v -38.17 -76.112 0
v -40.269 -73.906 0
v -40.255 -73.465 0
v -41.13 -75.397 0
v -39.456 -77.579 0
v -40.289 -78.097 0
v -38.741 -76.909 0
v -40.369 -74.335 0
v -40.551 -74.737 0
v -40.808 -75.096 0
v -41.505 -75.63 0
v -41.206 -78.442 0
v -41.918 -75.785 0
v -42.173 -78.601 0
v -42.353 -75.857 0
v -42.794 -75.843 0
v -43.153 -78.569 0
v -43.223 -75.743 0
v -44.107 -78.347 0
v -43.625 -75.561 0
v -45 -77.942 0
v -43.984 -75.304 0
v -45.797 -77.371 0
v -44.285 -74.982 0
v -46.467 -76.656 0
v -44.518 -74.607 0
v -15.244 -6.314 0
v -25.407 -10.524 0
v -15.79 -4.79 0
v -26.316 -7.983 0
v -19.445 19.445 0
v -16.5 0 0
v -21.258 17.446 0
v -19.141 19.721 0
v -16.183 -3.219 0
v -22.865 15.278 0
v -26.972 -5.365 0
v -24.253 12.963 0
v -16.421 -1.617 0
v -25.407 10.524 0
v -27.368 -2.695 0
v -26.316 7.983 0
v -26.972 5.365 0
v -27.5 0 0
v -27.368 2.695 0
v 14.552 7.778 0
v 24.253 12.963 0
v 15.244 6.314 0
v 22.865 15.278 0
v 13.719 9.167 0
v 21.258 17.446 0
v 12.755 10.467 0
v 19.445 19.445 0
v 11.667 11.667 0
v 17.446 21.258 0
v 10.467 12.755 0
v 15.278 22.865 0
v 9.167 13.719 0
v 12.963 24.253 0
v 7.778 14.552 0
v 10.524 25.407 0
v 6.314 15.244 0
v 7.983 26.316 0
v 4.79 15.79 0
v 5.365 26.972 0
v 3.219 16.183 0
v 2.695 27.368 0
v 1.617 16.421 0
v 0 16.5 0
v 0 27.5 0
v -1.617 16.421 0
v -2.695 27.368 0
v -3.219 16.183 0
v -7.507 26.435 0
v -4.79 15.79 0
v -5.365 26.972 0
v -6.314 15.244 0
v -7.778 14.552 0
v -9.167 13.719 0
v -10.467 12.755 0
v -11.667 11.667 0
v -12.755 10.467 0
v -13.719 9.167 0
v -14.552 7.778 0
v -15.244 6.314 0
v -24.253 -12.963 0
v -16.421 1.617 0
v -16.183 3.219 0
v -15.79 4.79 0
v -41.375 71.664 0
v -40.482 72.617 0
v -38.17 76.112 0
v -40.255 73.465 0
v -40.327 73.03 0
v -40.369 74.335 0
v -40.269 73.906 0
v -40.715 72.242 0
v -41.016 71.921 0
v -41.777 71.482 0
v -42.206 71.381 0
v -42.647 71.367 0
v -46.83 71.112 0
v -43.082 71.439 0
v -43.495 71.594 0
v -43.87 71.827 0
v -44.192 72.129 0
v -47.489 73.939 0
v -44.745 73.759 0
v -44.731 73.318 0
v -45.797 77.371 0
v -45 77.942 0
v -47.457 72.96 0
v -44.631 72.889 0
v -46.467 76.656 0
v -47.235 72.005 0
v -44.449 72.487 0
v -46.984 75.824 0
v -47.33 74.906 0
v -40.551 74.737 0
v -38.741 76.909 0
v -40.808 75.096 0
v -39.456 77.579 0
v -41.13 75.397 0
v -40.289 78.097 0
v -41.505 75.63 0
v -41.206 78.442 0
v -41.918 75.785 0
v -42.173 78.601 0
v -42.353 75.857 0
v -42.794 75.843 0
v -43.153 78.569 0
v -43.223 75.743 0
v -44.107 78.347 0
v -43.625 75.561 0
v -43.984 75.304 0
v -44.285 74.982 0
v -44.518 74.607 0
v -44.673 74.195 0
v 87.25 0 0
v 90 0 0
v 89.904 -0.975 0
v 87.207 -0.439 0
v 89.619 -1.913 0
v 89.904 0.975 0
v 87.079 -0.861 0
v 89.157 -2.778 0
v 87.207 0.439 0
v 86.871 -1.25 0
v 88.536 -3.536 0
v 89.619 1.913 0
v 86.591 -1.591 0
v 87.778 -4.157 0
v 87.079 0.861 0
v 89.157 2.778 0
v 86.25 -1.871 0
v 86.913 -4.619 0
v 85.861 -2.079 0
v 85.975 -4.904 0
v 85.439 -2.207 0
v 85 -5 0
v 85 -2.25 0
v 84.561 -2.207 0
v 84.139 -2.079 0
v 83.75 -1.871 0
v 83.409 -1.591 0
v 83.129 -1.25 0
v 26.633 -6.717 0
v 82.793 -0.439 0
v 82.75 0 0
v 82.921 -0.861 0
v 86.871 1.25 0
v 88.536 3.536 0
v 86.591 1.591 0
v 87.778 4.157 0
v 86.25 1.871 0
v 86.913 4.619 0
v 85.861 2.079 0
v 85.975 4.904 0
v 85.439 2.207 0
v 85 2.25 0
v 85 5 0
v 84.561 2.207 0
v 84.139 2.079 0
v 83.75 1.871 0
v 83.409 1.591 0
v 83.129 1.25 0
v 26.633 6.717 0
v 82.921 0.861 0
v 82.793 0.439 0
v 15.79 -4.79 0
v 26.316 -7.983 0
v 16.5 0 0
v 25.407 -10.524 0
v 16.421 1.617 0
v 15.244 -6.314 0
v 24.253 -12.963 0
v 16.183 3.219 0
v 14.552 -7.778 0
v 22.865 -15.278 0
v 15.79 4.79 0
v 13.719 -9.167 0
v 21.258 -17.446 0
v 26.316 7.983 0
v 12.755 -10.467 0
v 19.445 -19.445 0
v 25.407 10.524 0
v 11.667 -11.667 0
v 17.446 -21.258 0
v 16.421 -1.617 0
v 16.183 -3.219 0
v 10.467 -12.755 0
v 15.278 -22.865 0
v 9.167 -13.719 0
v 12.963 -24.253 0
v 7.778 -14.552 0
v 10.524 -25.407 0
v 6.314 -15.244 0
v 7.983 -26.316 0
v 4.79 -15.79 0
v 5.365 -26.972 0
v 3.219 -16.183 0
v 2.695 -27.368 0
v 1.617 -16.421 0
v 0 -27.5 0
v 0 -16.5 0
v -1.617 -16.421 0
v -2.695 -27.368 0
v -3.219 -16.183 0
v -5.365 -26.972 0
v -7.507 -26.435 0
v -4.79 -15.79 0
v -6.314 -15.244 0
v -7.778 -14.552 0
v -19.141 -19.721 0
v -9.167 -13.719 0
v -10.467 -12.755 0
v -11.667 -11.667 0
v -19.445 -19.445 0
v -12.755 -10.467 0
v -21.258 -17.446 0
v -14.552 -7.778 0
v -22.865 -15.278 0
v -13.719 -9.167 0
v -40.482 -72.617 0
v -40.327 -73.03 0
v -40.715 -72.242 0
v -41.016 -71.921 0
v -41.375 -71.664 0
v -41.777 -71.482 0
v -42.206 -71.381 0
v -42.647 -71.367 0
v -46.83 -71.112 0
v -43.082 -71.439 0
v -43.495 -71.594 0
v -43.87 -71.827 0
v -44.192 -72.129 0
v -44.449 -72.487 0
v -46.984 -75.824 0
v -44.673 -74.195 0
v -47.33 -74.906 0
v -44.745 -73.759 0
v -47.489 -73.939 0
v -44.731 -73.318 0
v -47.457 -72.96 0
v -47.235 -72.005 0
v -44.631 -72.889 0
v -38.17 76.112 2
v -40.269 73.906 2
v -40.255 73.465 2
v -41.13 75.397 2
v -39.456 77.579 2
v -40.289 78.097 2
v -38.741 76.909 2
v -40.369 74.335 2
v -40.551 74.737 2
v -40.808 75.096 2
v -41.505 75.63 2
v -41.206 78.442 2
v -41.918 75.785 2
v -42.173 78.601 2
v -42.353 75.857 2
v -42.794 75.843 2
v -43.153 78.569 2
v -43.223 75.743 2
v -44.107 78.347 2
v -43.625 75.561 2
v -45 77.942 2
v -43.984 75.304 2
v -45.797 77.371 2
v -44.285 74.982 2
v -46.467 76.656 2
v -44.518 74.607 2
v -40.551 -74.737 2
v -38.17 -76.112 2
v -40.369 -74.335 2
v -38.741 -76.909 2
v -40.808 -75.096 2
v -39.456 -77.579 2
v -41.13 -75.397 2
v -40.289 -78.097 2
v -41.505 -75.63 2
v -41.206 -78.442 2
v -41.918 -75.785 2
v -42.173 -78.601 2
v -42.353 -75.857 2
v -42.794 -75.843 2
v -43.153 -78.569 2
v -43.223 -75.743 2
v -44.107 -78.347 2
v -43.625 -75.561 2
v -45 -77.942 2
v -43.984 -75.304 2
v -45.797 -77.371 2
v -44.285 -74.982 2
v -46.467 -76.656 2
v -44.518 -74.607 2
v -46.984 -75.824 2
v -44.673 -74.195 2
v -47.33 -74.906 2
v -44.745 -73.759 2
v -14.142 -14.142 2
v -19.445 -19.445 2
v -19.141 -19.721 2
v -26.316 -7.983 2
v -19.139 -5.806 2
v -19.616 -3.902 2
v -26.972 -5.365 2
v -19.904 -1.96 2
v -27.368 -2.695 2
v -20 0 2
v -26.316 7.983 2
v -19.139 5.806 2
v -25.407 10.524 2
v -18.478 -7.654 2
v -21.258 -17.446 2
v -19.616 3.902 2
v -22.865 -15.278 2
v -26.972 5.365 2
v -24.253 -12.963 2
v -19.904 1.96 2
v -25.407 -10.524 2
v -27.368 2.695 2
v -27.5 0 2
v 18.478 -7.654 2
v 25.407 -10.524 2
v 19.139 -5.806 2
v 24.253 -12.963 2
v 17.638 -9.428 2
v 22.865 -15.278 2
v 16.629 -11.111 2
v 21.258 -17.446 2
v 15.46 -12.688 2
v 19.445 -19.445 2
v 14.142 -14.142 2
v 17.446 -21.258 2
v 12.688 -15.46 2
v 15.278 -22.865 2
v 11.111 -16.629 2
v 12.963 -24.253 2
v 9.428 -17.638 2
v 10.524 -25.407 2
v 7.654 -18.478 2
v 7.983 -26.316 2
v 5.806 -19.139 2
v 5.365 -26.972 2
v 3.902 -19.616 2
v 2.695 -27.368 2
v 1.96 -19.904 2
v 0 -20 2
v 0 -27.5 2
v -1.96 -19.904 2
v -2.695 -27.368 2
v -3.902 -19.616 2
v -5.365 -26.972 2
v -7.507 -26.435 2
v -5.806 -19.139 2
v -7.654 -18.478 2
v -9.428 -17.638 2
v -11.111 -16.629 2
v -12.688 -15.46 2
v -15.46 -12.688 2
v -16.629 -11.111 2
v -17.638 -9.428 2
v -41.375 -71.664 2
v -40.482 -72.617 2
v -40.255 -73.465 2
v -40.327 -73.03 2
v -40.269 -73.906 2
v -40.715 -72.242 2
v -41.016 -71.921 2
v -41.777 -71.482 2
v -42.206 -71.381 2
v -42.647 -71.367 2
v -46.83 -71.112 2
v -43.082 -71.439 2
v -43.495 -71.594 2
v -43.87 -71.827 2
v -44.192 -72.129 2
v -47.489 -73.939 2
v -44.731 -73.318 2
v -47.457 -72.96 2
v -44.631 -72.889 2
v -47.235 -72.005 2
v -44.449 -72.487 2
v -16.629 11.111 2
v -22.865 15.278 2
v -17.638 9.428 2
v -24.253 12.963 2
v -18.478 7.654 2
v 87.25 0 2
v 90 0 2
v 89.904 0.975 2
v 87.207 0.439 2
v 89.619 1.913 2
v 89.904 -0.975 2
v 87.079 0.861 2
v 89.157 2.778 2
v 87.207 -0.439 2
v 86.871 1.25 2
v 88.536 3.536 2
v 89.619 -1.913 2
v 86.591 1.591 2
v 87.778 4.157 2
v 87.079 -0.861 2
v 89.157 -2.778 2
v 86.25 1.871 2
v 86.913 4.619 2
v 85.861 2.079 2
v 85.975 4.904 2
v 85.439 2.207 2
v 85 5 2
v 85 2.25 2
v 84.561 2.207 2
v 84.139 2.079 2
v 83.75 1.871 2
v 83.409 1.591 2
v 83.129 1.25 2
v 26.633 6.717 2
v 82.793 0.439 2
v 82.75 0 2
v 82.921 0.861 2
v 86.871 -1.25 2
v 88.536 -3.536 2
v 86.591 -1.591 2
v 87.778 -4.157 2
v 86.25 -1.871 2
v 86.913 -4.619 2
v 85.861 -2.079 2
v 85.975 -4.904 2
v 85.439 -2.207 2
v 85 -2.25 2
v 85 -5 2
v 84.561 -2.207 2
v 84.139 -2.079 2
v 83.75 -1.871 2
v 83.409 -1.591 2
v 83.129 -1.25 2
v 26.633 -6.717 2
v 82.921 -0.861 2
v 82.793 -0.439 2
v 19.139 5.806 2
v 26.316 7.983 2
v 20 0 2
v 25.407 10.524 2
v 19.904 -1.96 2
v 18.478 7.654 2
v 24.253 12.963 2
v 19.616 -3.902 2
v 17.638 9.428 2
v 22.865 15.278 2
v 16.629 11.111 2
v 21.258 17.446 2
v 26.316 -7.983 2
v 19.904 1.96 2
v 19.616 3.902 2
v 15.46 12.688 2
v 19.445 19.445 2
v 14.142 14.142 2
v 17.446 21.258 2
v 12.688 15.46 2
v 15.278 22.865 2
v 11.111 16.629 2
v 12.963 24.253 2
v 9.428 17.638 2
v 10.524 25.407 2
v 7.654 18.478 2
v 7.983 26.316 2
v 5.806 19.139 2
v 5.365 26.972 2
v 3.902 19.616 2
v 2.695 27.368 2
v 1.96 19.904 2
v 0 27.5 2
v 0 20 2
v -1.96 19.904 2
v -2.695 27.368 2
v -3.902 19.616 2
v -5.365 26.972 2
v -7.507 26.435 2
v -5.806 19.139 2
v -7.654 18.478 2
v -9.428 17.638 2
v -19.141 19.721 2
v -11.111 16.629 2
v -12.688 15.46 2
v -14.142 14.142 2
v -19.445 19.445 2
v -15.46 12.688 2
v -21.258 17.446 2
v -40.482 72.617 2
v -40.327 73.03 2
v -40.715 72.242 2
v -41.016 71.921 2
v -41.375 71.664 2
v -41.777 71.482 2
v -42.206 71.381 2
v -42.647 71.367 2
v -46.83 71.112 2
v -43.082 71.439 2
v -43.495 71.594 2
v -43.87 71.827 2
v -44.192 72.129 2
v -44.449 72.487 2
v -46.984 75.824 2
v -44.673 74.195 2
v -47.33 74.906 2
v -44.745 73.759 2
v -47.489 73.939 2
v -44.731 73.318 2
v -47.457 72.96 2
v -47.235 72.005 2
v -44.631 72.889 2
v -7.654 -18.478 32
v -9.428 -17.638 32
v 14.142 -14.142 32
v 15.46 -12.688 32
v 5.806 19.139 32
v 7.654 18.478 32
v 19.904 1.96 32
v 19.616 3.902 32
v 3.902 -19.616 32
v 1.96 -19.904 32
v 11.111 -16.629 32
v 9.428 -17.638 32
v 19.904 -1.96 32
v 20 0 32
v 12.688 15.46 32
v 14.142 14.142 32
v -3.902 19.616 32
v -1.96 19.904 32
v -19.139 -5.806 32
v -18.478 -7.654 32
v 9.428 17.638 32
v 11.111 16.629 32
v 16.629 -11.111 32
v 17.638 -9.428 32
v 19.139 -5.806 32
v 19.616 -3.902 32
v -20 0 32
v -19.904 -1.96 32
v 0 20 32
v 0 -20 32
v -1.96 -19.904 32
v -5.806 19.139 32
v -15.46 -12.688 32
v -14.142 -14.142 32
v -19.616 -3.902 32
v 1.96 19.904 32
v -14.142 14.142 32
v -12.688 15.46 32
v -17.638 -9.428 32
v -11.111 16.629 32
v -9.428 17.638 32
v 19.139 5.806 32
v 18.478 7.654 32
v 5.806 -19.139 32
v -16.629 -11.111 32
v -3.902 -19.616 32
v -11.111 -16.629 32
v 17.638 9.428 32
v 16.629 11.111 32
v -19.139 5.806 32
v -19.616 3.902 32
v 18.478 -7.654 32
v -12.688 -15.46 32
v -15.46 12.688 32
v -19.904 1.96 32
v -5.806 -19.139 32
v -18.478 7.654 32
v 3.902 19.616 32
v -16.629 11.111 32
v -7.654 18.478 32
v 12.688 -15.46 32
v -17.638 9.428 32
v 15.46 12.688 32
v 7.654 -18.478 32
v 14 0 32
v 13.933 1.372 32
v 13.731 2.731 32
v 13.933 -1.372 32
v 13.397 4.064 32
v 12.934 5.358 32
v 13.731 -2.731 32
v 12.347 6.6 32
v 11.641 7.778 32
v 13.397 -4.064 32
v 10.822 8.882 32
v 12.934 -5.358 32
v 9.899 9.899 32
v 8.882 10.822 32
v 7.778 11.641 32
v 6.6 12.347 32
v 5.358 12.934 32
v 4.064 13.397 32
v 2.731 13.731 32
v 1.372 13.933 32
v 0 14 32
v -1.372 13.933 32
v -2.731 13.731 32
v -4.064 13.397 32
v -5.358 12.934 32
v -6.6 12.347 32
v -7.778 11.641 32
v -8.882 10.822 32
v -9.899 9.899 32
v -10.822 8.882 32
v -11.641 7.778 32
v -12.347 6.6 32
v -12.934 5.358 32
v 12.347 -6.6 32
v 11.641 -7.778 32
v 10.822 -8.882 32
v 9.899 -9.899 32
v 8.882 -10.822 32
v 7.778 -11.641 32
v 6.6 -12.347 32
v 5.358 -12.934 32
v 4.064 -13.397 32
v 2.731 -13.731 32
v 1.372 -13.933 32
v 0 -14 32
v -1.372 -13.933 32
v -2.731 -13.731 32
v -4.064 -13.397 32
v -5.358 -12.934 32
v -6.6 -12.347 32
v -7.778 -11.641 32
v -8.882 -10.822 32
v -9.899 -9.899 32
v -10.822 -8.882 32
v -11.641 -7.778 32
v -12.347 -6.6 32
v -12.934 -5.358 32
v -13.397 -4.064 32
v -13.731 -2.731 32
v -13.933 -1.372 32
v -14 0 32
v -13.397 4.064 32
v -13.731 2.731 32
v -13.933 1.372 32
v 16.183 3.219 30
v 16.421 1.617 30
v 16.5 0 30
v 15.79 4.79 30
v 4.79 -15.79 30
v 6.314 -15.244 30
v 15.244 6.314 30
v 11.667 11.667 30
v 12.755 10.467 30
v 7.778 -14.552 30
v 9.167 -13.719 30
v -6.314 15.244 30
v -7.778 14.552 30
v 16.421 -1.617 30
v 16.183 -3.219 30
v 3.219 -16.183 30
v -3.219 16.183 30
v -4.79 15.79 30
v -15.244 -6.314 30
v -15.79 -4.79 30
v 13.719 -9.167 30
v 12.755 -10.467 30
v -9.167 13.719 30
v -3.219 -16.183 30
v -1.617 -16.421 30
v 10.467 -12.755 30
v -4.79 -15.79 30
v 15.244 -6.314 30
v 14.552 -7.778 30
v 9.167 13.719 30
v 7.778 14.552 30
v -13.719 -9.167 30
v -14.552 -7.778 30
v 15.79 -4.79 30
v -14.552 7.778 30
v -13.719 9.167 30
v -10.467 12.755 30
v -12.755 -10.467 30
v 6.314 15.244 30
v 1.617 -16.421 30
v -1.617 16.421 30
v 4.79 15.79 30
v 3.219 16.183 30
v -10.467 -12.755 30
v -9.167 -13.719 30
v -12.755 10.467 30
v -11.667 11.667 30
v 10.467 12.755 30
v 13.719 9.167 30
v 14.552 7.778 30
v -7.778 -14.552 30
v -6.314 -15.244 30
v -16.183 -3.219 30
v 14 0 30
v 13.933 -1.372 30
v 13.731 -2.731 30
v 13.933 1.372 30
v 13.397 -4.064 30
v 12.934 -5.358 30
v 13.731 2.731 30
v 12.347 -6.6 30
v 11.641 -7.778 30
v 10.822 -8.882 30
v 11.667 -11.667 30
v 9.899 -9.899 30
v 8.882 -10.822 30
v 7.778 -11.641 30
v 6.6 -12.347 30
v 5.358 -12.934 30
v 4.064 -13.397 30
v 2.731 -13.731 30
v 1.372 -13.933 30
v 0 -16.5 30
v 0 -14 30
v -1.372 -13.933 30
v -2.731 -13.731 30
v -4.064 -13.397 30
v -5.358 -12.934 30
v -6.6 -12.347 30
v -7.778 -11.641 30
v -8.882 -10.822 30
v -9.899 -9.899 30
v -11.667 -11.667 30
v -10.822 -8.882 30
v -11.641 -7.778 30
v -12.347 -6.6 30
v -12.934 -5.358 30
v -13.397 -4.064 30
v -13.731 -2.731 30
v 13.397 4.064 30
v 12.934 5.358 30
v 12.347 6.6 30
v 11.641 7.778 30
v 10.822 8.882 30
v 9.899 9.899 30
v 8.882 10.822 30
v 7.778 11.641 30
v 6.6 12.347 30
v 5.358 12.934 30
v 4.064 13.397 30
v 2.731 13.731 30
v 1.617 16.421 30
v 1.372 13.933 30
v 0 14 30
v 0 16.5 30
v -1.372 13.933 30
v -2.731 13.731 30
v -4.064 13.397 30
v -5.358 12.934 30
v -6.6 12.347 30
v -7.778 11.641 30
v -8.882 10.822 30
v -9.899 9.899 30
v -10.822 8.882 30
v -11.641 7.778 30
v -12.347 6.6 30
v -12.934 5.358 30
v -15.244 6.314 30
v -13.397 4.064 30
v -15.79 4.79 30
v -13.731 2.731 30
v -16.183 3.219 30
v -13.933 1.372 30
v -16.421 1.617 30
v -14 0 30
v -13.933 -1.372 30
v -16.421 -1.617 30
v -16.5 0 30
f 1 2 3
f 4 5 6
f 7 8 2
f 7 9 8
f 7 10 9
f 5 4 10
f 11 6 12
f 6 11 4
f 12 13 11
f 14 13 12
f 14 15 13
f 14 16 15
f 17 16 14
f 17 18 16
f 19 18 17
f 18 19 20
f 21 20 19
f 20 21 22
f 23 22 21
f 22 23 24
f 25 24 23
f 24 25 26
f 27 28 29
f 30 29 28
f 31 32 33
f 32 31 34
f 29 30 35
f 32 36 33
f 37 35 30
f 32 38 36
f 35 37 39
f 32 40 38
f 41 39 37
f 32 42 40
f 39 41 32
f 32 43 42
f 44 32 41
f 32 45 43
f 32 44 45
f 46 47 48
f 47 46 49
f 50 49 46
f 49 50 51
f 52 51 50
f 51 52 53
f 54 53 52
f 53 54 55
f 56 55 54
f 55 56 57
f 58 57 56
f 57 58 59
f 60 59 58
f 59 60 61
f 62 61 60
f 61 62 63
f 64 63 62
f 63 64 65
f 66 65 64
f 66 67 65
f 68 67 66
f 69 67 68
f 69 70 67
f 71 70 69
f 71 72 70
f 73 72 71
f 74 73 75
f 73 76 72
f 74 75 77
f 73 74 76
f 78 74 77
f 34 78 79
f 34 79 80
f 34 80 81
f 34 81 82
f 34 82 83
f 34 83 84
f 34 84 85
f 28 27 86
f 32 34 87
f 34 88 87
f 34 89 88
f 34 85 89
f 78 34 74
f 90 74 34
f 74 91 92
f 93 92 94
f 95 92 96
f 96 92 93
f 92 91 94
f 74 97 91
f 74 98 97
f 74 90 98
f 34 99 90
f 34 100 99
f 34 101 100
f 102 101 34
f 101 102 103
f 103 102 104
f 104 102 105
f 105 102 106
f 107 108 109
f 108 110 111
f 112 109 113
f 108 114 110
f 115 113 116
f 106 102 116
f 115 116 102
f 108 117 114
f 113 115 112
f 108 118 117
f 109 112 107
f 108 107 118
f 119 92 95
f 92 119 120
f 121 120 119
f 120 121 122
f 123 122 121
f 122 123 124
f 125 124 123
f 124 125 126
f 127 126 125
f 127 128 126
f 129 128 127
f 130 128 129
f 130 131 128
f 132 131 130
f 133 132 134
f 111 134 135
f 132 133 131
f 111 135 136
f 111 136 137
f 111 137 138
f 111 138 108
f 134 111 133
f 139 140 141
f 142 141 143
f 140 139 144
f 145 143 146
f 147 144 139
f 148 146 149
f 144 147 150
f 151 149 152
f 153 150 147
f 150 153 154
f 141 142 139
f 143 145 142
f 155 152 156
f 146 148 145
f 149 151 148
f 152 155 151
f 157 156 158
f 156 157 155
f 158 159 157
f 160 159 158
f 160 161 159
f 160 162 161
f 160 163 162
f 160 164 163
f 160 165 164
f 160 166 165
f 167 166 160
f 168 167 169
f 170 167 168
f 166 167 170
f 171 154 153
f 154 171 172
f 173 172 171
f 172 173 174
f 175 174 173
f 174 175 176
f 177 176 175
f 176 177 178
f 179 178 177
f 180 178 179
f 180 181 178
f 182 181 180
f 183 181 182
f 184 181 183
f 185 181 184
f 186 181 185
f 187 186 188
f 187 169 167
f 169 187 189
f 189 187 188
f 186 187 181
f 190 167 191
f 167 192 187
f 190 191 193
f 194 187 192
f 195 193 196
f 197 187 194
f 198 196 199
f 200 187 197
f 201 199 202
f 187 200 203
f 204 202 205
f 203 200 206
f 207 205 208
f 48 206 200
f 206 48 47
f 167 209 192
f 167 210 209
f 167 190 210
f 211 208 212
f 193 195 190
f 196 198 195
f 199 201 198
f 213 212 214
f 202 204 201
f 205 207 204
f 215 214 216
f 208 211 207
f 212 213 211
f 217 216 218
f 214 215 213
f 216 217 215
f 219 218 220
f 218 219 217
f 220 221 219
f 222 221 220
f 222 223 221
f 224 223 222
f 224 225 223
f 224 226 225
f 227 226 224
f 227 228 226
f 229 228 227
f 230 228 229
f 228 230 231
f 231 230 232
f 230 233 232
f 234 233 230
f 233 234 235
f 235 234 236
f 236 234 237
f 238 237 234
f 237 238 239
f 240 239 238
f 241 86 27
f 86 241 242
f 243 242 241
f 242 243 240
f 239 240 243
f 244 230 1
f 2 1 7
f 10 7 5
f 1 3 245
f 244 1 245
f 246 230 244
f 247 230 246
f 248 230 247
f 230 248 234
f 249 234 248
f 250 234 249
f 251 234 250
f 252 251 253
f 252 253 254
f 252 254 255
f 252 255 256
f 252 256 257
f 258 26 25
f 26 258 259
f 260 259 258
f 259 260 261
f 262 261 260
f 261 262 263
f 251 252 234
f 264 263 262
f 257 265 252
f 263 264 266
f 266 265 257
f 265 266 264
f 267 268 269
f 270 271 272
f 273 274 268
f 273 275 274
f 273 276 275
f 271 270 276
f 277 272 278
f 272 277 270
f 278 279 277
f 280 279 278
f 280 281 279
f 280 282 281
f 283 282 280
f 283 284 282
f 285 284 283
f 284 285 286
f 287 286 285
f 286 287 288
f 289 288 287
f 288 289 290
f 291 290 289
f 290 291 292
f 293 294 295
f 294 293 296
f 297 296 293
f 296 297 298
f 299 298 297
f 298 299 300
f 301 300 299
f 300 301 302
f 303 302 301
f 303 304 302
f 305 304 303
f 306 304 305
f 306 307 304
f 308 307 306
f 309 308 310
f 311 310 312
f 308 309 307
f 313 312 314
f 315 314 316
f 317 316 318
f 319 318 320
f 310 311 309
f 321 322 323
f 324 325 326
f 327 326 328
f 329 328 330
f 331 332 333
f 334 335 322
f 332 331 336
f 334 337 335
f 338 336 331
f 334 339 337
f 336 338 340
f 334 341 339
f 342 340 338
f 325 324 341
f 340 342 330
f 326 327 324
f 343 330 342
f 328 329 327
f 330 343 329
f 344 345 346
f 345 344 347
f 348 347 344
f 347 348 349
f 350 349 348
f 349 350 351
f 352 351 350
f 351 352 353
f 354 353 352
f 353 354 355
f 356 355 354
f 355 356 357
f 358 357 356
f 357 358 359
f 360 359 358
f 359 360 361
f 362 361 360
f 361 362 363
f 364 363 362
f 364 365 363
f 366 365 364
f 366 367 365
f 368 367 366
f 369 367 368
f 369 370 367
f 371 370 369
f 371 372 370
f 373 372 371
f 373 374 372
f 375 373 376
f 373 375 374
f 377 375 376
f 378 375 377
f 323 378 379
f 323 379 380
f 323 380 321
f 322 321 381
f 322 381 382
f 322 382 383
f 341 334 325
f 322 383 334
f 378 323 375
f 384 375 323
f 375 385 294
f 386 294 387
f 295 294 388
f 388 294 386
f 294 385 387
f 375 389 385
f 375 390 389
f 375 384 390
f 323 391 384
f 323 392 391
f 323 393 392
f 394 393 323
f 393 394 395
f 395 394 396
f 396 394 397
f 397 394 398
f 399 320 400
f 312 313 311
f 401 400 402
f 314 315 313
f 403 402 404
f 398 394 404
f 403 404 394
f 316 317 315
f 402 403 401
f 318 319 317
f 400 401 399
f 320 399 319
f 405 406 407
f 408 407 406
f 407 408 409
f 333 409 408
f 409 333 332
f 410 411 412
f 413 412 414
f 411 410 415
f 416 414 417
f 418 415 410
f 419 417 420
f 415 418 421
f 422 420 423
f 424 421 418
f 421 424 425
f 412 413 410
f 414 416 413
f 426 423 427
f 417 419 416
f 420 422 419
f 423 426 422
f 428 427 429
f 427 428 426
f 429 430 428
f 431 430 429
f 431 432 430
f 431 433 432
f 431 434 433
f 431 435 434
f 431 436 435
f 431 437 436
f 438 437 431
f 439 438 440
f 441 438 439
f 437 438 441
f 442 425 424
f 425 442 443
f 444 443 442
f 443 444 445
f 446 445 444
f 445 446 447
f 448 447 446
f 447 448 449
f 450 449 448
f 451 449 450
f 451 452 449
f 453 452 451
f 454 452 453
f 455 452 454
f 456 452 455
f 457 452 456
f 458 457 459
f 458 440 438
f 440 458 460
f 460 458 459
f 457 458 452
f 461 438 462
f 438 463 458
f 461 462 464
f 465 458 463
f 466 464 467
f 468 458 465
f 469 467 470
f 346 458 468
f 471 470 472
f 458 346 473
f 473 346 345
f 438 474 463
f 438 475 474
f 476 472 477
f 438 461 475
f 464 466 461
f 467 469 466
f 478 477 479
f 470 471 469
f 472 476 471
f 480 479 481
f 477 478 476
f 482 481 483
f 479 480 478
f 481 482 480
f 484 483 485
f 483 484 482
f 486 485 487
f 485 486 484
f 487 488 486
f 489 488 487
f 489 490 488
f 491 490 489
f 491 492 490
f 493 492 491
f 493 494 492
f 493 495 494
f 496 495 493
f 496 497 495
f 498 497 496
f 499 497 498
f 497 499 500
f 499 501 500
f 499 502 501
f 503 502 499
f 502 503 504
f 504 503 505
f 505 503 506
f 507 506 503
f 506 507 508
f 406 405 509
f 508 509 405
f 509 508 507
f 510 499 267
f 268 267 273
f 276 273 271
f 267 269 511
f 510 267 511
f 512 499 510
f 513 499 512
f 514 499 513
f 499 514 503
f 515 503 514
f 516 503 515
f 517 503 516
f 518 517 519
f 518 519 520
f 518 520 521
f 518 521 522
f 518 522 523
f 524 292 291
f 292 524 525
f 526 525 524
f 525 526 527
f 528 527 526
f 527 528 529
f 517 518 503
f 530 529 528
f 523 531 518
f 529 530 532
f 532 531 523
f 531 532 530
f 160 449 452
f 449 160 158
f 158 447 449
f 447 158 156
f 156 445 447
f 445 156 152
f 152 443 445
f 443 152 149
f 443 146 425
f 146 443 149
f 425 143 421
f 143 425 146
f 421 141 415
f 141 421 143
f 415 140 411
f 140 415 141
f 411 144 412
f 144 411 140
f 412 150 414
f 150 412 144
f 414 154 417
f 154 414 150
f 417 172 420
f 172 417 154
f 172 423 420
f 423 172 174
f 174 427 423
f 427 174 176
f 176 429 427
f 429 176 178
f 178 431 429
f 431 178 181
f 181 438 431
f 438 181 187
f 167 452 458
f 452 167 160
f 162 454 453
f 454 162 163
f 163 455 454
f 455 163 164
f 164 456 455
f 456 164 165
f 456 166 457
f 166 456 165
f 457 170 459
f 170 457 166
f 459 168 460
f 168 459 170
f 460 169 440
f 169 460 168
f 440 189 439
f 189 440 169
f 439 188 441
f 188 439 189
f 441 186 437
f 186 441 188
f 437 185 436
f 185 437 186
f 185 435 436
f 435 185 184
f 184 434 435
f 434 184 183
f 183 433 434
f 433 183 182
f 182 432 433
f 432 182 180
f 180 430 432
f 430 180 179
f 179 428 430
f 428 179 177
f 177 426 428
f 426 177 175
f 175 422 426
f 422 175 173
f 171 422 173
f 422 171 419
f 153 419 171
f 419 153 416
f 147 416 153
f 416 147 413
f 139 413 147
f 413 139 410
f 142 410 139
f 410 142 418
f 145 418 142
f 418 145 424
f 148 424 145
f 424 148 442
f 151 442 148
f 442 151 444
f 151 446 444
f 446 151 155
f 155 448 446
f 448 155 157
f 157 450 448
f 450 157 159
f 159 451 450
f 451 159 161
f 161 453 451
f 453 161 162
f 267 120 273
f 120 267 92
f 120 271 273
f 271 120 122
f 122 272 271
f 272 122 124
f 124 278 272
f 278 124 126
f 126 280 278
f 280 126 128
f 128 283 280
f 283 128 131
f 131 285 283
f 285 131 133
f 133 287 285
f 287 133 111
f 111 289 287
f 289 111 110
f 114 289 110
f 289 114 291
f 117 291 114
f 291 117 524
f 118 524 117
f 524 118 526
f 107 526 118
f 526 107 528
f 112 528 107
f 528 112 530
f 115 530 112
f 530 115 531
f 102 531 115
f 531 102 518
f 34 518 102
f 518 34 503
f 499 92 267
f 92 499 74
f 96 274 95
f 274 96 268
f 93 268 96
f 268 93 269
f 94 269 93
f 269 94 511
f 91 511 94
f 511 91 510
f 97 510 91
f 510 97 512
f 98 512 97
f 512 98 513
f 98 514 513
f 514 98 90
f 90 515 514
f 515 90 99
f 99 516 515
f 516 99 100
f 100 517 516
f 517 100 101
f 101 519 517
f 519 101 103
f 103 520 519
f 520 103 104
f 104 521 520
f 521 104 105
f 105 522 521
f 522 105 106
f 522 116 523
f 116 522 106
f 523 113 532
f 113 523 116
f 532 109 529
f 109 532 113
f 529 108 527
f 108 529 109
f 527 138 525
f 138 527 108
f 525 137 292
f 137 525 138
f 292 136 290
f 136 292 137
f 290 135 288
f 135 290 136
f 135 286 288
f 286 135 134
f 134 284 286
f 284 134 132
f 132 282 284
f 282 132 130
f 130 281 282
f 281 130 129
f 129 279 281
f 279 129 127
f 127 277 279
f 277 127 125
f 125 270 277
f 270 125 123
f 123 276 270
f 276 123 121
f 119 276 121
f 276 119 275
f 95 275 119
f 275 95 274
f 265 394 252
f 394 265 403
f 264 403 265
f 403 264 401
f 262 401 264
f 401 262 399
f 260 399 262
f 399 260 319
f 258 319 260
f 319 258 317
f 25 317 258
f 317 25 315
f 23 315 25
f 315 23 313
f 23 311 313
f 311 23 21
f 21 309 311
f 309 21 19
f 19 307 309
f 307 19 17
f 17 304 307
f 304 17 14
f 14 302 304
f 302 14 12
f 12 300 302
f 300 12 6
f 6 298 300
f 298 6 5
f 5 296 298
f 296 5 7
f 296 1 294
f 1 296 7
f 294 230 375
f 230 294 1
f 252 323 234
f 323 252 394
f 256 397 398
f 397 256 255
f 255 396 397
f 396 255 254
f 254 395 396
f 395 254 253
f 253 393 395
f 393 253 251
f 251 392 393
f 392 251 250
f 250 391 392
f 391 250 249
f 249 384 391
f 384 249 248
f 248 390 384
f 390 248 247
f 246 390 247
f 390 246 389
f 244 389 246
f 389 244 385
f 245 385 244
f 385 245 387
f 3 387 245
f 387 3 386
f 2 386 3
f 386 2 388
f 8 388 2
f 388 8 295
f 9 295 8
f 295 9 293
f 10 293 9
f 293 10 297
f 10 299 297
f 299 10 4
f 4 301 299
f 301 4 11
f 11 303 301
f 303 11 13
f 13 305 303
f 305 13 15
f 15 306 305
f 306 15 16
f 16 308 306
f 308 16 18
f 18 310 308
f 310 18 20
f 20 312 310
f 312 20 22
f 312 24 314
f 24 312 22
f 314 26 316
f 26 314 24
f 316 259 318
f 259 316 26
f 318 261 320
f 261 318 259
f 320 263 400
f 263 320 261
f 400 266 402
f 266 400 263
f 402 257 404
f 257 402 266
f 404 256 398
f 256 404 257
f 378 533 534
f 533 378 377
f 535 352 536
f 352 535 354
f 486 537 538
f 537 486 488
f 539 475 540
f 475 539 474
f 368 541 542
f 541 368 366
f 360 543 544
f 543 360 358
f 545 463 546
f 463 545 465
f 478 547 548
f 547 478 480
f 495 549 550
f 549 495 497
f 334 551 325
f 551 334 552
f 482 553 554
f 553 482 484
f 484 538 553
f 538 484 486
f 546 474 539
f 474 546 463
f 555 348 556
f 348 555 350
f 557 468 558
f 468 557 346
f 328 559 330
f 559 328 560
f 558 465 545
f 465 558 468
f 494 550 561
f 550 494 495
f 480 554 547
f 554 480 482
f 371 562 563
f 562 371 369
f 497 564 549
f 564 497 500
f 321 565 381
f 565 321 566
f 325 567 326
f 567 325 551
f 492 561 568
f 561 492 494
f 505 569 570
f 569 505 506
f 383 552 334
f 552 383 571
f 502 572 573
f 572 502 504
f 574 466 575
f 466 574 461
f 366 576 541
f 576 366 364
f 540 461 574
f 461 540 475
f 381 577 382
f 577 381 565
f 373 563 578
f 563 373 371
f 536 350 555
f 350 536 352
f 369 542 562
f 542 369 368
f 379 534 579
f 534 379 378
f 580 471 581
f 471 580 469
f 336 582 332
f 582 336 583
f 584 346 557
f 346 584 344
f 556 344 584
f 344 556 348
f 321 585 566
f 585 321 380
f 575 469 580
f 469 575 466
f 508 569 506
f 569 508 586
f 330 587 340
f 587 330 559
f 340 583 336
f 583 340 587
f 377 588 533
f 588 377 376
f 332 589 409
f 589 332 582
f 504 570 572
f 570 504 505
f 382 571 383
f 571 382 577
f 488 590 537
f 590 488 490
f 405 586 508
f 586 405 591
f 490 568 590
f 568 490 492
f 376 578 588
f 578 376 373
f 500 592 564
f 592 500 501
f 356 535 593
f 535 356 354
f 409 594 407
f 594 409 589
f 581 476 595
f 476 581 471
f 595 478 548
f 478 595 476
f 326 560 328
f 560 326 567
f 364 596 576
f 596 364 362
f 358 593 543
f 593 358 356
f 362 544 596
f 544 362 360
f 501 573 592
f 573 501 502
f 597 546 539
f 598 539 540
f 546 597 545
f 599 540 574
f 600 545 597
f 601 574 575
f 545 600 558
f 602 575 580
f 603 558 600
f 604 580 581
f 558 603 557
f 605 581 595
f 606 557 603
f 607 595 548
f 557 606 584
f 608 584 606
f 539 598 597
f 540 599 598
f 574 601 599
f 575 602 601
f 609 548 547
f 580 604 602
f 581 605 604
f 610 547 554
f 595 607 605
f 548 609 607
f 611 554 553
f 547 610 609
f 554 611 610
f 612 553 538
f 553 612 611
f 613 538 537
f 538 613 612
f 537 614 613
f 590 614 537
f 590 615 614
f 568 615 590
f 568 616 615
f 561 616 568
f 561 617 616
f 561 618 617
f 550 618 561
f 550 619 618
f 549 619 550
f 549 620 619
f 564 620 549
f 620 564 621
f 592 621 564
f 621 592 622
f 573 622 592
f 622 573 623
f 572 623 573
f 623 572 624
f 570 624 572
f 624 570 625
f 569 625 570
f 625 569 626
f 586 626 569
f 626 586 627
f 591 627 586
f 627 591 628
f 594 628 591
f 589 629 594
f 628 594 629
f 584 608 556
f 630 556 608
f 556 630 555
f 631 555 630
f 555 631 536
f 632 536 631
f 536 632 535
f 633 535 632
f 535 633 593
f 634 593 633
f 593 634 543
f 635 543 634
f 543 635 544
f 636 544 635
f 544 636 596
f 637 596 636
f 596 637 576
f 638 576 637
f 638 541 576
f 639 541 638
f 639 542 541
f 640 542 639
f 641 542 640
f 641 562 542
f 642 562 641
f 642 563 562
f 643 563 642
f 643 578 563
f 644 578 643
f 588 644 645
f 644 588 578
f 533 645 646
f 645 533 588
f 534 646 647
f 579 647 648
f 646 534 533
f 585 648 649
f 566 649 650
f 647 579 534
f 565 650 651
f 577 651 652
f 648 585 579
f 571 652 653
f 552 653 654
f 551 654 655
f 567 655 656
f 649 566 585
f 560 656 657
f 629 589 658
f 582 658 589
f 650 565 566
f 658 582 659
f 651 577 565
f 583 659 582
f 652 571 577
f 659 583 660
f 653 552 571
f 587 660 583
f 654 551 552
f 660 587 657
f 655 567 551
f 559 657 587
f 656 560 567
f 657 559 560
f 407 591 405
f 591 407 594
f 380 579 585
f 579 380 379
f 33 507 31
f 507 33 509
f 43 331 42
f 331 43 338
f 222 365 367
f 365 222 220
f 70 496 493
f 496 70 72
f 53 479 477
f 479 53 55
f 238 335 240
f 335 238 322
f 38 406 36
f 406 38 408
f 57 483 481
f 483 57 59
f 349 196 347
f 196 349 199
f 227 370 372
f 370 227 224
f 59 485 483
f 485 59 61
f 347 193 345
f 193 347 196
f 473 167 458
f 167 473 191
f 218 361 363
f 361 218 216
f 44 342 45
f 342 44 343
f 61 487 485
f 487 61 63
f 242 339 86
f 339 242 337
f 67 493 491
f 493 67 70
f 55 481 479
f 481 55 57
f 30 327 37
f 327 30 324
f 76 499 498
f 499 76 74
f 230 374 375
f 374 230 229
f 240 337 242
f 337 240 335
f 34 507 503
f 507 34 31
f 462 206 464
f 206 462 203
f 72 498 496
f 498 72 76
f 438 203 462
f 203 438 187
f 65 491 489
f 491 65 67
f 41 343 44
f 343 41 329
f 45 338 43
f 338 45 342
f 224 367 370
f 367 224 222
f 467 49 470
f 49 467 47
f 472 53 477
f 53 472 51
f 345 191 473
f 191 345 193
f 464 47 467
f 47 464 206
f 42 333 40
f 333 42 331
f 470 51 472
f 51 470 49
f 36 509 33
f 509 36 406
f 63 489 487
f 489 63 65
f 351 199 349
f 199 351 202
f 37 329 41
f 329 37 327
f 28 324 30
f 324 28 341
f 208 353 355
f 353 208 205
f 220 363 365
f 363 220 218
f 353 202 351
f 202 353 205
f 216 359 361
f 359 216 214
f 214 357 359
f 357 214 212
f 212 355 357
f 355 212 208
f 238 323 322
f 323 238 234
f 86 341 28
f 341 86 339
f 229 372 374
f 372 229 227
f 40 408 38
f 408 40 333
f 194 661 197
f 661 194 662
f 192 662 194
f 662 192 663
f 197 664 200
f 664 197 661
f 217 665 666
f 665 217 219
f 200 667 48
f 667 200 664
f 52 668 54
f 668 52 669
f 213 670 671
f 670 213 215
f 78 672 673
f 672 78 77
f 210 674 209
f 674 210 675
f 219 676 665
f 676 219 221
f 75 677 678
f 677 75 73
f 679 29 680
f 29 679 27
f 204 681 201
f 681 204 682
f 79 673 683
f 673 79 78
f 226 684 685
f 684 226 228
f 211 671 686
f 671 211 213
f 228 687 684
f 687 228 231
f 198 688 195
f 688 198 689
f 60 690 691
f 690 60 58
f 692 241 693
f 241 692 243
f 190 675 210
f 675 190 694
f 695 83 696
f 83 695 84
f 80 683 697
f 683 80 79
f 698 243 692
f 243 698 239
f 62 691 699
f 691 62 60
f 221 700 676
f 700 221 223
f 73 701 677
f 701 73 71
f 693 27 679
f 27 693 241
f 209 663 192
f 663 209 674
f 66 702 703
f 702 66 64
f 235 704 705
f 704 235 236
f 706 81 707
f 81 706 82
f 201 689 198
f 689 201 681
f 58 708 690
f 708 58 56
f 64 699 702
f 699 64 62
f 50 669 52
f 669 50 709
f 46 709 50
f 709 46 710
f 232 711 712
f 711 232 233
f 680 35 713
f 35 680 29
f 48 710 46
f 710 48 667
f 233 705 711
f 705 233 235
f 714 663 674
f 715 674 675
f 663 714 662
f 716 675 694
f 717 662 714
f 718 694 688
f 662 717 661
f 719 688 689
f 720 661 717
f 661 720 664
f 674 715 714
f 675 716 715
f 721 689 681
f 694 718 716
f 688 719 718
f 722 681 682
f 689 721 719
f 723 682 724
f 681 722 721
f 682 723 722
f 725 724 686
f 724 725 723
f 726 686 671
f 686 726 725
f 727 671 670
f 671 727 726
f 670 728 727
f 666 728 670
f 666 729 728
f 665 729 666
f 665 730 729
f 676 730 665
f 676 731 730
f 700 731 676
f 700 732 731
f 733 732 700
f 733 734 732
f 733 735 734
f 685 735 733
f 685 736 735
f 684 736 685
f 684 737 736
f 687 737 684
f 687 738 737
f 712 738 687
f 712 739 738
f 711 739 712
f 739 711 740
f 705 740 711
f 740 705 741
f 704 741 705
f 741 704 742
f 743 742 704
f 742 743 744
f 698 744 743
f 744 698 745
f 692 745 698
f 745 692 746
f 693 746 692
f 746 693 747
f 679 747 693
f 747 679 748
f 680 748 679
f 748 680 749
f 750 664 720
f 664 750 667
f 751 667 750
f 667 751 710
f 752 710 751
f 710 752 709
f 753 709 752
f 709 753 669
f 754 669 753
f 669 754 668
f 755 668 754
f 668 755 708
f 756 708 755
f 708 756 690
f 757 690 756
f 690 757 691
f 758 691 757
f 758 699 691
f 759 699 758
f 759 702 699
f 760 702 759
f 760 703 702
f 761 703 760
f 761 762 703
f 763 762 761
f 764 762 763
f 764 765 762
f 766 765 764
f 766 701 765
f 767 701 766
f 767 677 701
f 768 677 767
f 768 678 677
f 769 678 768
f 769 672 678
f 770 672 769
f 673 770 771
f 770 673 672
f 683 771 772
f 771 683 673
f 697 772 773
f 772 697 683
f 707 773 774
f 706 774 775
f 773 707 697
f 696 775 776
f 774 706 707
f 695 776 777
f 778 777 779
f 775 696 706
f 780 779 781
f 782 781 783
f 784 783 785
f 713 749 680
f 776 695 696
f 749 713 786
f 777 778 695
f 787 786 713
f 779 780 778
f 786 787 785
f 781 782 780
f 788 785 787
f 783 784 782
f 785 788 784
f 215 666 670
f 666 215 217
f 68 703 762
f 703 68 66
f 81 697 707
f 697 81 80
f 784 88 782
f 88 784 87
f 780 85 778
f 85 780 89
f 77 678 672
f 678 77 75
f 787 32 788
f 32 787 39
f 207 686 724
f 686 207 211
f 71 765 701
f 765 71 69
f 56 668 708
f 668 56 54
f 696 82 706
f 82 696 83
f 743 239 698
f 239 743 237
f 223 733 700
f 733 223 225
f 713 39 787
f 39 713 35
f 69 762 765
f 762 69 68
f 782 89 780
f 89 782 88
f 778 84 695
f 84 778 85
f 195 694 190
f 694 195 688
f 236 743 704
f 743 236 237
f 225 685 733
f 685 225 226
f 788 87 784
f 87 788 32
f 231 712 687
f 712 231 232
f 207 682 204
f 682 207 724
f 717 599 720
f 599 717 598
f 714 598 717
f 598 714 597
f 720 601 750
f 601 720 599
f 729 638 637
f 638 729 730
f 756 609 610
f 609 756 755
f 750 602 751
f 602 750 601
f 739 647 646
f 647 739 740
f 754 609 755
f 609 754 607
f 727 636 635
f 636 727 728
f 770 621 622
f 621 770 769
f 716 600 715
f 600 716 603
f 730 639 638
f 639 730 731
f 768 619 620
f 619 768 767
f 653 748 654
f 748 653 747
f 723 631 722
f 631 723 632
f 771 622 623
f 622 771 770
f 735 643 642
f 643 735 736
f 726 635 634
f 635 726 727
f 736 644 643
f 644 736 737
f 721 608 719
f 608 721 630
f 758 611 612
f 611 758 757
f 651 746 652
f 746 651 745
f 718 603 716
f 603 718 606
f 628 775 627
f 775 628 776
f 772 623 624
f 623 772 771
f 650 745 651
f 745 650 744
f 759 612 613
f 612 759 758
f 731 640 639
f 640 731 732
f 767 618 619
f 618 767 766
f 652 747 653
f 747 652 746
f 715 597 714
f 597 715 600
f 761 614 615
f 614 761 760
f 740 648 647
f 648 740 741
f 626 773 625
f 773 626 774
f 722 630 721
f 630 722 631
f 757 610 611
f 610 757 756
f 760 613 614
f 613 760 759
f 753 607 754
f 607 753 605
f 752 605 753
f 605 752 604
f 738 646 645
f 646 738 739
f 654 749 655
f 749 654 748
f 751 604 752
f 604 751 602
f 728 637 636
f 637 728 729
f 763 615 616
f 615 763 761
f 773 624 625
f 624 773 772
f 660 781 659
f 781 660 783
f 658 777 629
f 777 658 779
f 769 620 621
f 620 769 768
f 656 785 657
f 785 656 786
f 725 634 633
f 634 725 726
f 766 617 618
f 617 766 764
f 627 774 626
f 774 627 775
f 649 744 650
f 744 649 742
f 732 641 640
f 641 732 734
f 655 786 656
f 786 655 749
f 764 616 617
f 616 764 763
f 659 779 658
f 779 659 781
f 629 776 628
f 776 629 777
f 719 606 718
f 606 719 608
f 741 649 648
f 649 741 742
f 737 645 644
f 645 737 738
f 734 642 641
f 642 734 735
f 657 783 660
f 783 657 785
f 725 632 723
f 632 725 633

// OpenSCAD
// file: ../bases/low_pro_with_adaptor.scad
// Low-profile lampshade base with an integrated adaptor mount: a spoked disc
// with straight foot-mounting holes around its rim and a central boss that
// the adaptor (see ../adaptor/adaptor.scad) mounts into.
//
// Placeholder: geometry not yet implemented -- currently just previews the
// mount boss and foot-hole positions so the parameter set can be wired up
// and iterated on before the spoke/rim shape is designed.
module low_pro_with_adaptor(
    num_spokes = 3,             // number of spokes joining the rim to the center mount (also the number of foot-mounting holes, one per spoke)
    foot_hole_diameter = 4.5,   // diameter of each straight foot-mounting hole, bottom to top (mm)
    foot_hole_radius = 70,      // radius from center at which the foot-mounting holes sit, one per spoke, on the spoke's centerline (mm)
    spoke_width = 6,            // width of each spoke at its tip, i.e. at the foot-mounting hole (mm)
    spoke_width_center = 12,    // width of each spoke at the center mount, tapering down to spoke_width at the tip (mm)
    spoke_height = 3,           // height of each spoke (mm)
    mount_od = 40,              // outer diameter of the central adaptor-mount boss (mm)
    mount_id = 33,               // inner diameter of the central adaptor-mount boss, i.e. the bore the adaptor sits in (mm)
    mount_height = 30,           // height of the central adaptor-mount boss (mm)
    mount_hole_diameter = 28   // diameter of the fixing hole(s) through the mount boss, e.g. for a self-tapping screw into the adaptor (mm)
) {
    union() {    
        difference() {
            union() {
                cylinder(h = mount_height + spoke_height, d = mount_od, $fn = 64);
                cylinder(h = spoke_height, d = mount_od + 15, $fn = 64);
                for (n = [0:1:num_spokes]) {
                    rotate([0,0,n*360/num_spokes]) {
                        linear_extrude(spoke_height) {
                            difference() {
                                union() {
                                    polygon(points = [
                                        [0, spoke_width_center/2],
                                        [foot_hole_radius, spoke_width/2],
                                        [foot_hole_radius, -spoke_width/2],
                                        [0, -spoke_width_center/2]
                                    ]);
                                    translate([foot_hole_radius,0,-1]) circle(d = spoke_width, $fn = 32);
                                }
                                translate([foot_hole_radius,0,-1]) circle(d = foot_hole_diameter, $fn = 32);
                            }
                        }
                    }
                }
            }
            translate([0, 0, -1]) cylinder(h = mount_height + spoke_height - 1, d = mount_id, $fn = 64);
            translate([0, 0, -1]) cylinder(h = mount_height + spoke_height + 2, d = mount_hole_diameter, $fn = 64);
        }        
    }
}

// Standalone preview with default parameters
low_pro_with_adaptor();
// main file
use <../bases/low_pro_with_adaptor.scad>;

// Copied from rope_swirl_large.scad -- keep these in sync with that file so
// the base's spokes/foot holes/mount bore line up with the shade.
num_feet = 3;             // number of spokes/feet; must match num_feet in rope_swirl_large.scad
foot_hole_diameter = 4.5; // must match foot_hole_diameter in rope_swirl_large.scad (mm)
foot_hole_radius = 85;    // must match foot_hole_radius in rope_swirl_large.scad (mm)
mount_od = 40;            // outer diameter of the central adaptor-mount boss; must match center_hole_diameter in rope_swirl_large.scad (mm)

spoke_width = 10;          // width of each spoke at its tip, i.e. at the foot-mounting hole (mm)
spoke_width_center = 15;  // width of each spoke at the center mount, tapering down to spoke_width at the tip (mm)
spoke_height = 2;         // height of each spoke (mm)
mount_id = 33;            // inner diameter of the central adaptor-mount boss, i.e. the bore the adaptor sits in (mm)
mount_height = 30;         // height of the central adaptor-mount boss (mm)
mount_hole_diameter = 28; // diameter of the fixing hole(s) through the mount boss (mm)

low_pro_with_adaptor(
    num_spokes = num_feet,
    foot_hole_diameter = foot_hole_diameter,
    foot_hole_radius = foot_hole_radius,
    spoke_width = spoke_width,
    spoke_width_center = spoke_width_center,
    spoke_height = spoke_height,
    mount_od = mount_od,
    mount_id = mount_id,
    mount_height = mount_height,
    mount_hole_diameter = mount_hole_diameter
);
